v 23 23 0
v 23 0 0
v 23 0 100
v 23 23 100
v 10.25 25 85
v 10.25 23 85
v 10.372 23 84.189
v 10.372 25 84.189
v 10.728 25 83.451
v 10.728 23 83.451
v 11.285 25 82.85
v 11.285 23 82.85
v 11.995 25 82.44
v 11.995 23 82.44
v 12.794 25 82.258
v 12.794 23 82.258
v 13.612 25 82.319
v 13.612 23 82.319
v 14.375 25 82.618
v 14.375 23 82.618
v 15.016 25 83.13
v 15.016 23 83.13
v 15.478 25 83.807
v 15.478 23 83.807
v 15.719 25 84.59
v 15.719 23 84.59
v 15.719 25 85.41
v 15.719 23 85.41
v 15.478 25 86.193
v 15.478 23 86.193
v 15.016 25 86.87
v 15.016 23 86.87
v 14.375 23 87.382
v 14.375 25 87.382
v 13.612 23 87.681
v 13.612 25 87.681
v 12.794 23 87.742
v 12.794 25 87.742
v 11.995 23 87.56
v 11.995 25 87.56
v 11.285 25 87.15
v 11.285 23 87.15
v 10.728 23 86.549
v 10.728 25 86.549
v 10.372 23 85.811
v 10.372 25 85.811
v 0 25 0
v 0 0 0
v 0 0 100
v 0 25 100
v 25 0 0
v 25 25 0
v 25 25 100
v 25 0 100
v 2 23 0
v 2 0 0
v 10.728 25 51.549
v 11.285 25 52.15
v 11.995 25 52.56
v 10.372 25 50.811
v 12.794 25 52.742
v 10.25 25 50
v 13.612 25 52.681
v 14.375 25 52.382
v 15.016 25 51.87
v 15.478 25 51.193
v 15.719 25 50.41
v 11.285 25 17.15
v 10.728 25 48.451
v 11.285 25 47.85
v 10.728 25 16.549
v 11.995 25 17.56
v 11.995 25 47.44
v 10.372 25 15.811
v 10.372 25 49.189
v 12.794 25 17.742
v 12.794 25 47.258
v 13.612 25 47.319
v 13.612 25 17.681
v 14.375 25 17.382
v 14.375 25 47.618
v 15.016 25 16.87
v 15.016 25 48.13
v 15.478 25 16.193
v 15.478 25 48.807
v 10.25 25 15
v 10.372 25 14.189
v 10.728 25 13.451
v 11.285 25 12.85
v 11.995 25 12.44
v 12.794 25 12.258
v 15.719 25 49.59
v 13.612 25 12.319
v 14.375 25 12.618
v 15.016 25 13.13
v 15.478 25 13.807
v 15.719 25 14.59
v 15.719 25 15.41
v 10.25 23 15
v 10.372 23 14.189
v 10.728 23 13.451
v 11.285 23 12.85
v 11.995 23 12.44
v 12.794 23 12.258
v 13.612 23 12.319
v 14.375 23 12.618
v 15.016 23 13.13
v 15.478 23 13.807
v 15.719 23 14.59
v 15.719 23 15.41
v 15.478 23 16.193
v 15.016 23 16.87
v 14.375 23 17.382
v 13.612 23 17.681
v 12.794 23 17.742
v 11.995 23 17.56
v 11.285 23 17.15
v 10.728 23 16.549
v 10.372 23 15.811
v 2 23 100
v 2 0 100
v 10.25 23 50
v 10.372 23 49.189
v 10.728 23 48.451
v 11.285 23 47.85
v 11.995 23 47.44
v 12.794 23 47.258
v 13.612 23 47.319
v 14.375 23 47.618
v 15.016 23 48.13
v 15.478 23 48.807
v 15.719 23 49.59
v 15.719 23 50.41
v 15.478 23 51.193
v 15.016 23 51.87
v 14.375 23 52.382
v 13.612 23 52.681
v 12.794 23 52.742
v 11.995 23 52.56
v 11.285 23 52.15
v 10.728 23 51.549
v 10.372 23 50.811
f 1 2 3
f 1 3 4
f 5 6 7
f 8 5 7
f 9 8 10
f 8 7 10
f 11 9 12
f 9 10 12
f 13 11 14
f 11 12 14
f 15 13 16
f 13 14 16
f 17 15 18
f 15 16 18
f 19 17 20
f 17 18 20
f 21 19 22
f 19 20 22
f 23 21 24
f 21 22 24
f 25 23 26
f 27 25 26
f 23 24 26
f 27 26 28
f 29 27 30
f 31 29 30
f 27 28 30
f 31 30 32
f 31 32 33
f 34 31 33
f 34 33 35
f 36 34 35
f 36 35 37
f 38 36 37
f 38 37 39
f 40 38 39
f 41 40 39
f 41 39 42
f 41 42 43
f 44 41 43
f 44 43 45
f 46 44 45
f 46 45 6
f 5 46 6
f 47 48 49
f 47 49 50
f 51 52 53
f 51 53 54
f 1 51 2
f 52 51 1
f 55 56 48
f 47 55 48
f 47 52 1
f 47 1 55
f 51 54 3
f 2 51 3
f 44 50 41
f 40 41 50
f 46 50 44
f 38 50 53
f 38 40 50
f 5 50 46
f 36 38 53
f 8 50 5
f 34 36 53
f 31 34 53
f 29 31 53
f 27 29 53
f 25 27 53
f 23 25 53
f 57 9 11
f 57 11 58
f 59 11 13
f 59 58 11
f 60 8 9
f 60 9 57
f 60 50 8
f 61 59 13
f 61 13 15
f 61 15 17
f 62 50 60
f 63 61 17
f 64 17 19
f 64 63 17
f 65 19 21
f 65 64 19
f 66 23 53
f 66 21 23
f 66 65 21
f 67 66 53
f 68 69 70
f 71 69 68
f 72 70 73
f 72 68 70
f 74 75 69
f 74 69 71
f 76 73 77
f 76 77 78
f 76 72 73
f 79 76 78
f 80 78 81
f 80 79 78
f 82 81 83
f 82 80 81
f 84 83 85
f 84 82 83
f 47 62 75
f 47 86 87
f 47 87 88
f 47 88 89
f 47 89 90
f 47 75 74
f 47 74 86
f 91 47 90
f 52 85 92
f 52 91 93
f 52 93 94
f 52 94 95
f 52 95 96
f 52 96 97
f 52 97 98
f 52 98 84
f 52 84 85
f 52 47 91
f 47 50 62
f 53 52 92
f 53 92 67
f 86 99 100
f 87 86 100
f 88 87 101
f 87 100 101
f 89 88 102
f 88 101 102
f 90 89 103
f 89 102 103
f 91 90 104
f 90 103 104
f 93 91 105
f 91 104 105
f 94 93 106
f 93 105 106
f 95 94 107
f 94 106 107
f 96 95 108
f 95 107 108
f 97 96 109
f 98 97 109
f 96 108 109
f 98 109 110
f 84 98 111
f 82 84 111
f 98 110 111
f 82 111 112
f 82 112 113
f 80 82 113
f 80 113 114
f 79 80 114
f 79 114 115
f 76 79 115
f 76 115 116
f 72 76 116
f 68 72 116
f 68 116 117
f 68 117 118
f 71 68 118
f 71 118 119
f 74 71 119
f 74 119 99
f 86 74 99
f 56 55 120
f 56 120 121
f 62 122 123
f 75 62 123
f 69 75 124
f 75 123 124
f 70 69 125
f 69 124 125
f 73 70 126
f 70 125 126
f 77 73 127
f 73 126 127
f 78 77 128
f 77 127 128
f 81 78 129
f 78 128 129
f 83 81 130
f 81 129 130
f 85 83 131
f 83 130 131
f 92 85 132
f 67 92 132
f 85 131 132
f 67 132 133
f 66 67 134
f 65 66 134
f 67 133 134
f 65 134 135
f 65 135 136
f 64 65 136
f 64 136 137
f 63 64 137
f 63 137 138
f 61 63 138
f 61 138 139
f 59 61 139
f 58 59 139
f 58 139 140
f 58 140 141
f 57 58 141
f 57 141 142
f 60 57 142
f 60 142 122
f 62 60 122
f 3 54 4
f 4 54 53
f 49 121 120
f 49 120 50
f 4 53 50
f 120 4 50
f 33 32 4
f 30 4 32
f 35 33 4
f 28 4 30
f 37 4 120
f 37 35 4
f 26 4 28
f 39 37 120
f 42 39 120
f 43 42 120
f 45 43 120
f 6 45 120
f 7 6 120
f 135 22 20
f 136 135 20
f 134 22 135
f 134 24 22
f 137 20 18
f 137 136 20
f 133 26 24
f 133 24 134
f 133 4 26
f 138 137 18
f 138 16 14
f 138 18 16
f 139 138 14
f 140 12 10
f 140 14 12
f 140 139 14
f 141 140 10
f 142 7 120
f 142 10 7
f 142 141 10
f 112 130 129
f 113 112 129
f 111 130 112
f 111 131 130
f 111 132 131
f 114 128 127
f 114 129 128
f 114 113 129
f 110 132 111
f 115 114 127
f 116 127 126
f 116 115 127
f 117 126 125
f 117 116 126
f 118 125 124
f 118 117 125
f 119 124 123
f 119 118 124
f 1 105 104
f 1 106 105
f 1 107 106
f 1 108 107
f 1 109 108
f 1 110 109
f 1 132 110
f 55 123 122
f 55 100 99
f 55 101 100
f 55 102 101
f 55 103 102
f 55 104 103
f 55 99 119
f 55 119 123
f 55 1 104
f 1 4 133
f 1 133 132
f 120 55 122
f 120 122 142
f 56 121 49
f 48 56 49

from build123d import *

# Parameters (mm, degrees)
DODANIE_WYCI_GNI_CIE1_DEPTH = 100
M5_CLEARANCE_HOLE1_D        = 5.5


with BuildPart() as part:
    # Szkic1 → Dodanie-wyciągnięcie1 (new body)
    with BuildSketch(Plane.XY):
        Polygon((0, 0), (0, 25), (25, 25), (25, 0), (23, 0), (23, 23), (2, 23), (2, 0), align=None)
    extrude(amount=DODANIE_WYCI_GNI_CIE1_DEPTH)

    # M5 Clearance Hole1 (through all)
    with Locations(Plane(origin=(0, 25, 0), x_dir=(1, 0, 0), z_dir=(0, 1, 0))):
        with Locations((13, -50), (13, -15), (13, -85)):
            Hole(M5_CLEARANCE_HOLE1_D / 2)


solid = part.part
